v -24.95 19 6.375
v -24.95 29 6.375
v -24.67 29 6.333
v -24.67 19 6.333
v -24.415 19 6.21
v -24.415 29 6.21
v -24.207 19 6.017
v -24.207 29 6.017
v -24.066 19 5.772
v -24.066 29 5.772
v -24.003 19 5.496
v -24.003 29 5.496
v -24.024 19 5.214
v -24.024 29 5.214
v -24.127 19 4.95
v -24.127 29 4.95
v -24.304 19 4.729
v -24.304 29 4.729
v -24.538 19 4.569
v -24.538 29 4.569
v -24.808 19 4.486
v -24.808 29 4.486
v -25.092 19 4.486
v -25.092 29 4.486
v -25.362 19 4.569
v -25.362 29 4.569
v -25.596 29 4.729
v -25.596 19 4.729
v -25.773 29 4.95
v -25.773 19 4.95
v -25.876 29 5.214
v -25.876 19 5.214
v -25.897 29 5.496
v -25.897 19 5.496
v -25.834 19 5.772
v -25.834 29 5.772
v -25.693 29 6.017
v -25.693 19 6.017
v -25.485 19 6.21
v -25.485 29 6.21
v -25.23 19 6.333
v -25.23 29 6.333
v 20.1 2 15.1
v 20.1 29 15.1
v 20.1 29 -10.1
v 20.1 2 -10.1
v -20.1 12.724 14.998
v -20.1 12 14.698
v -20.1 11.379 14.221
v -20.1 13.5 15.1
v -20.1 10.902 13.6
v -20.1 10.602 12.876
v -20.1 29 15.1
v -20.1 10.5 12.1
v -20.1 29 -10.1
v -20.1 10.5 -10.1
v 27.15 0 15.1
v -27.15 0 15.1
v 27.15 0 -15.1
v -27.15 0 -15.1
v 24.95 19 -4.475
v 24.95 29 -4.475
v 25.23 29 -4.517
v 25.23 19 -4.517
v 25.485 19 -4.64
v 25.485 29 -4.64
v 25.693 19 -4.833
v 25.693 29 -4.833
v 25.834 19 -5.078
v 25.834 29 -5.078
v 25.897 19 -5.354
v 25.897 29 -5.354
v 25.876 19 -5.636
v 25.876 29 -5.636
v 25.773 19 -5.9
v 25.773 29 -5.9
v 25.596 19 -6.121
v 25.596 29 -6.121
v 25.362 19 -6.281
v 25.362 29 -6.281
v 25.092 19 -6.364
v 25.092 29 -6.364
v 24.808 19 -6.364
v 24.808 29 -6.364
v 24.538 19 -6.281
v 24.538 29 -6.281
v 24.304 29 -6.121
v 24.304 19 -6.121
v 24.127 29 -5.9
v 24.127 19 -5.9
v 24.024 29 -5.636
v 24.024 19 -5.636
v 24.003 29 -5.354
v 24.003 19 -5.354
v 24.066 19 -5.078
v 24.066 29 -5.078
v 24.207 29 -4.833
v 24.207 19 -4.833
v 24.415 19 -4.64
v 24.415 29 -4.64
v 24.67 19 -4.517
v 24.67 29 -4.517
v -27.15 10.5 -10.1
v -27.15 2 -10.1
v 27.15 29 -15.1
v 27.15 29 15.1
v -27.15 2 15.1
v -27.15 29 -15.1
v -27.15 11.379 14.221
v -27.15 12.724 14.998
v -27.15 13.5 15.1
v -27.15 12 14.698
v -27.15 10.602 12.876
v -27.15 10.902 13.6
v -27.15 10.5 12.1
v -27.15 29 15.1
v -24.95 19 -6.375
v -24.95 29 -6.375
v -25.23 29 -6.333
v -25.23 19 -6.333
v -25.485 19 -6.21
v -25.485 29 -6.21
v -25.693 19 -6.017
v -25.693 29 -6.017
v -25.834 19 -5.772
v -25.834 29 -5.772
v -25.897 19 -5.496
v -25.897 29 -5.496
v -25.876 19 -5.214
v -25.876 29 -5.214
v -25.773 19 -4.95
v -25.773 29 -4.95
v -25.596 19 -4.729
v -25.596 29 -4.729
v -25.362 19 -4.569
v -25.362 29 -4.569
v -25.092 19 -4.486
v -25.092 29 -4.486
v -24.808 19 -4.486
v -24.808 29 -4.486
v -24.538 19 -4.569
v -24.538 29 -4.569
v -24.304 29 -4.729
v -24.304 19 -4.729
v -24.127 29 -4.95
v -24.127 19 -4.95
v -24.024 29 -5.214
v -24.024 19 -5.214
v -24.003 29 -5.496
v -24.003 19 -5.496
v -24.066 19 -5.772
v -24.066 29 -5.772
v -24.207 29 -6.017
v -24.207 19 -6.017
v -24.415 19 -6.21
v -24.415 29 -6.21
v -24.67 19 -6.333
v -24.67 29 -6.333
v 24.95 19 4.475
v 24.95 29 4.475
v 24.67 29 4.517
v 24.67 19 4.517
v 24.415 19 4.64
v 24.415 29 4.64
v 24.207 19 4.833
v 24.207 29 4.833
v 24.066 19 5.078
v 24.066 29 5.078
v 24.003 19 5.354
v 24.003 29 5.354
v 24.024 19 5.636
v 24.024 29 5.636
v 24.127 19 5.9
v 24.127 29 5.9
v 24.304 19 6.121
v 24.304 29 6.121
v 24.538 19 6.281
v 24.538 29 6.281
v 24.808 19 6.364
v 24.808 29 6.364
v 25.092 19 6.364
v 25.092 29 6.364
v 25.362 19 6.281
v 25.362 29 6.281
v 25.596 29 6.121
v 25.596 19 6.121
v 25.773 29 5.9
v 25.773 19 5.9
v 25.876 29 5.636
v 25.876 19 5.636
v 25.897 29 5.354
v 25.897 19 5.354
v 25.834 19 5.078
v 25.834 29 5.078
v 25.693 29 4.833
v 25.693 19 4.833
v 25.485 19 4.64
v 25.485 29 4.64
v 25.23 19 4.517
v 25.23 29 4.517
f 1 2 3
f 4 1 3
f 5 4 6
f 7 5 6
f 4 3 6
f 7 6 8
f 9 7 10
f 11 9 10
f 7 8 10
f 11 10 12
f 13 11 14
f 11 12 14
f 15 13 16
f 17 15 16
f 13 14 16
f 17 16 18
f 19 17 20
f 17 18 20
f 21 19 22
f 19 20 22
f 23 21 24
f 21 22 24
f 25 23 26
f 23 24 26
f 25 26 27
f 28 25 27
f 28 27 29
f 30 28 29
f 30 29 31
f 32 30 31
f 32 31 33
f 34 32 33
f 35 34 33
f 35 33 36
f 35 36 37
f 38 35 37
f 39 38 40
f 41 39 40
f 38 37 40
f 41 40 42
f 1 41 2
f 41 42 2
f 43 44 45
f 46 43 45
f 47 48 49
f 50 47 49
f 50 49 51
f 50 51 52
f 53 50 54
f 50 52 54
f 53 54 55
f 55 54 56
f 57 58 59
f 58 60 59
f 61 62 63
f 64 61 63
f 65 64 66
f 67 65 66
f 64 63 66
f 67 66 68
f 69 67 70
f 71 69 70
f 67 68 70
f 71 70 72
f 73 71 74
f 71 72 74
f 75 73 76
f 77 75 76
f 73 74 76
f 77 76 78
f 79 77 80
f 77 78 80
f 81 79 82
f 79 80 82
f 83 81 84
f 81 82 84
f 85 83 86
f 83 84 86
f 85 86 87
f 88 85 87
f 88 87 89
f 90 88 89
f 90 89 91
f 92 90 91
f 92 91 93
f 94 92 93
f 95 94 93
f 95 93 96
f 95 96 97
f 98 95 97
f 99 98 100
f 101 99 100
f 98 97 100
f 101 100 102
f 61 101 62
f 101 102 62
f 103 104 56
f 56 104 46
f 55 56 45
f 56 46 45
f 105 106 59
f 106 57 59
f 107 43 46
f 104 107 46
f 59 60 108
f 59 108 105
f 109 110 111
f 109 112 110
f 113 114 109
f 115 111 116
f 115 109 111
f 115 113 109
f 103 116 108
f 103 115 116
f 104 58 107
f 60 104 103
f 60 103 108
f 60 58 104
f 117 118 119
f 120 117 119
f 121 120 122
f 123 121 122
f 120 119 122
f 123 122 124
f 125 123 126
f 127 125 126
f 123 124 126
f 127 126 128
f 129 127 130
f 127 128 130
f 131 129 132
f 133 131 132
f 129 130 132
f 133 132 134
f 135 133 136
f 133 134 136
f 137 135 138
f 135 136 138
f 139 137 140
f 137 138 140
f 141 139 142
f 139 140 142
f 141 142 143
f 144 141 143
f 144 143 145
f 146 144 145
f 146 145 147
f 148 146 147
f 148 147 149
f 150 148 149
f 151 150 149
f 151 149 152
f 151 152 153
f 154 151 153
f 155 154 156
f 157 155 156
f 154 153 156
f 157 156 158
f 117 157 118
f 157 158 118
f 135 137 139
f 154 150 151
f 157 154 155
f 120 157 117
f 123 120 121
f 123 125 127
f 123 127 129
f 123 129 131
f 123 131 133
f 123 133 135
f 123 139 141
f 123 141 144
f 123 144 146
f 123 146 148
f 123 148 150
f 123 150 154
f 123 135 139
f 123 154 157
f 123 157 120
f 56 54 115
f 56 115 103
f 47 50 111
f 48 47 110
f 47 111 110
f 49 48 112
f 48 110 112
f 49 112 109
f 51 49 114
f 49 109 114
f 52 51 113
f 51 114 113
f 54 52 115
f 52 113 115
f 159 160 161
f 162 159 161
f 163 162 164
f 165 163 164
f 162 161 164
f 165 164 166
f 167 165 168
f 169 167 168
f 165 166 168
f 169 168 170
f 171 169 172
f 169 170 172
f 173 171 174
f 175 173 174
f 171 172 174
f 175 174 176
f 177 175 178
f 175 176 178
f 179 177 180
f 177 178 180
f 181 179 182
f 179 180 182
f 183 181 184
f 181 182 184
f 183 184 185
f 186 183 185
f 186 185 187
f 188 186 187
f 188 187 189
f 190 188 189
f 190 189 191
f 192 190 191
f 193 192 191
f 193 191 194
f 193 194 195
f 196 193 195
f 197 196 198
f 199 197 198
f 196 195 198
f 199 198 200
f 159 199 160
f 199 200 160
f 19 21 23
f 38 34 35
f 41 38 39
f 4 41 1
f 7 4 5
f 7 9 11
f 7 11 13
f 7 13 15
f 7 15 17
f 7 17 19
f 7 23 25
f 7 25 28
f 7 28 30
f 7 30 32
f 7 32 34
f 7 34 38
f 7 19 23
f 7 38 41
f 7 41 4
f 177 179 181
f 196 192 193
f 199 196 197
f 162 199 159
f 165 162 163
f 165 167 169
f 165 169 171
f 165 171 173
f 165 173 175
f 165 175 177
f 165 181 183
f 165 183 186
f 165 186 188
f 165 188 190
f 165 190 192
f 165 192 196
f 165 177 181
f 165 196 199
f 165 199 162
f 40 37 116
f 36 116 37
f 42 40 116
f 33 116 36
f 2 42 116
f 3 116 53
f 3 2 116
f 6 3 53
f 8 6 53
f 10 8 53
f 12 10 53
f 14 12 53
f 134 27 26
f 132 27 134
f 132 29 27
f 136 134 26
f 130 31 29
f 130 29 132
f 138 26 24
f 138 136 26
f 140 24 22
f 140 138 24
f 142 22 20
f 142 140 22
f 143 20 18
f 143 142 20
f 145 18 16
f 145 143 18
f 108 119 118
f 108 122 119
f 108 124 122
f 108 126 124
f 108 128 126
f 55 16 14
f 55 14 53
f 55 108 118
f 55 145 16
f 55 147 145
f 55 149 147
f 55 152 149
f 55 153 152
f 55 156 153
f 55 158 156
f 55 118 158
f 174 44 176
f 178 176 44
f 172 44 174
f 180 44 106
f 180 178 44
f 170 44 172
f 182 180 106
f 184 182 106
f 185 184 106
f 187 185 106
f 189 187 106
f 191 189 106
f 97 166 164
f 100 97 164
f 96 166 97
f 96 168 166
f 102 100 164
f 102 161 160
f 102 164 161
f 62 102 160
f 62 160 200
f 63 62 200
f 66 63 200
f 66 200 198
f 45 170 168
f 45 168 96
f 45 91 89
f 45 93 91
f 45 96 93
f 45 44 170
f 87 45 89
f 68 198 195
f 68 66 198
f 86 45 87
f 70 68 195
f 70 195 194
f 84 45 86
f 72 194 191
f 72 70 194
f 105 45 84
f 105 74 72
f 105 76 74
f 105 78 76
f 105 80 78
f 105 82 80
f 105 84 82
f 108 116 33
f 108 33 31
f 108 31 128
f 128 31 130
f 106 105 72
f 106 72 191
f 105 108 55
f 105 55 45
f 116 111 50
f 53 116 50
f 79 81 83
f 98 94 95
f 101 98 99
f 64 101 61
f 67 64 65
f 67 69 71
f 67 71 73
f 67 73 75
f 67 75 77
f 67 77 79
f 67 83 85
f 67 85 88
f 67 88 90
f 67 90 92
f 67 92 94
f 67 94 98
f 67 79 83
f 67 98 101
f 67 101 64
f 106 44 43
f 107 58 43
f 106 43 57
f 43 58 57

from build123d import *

# Parameters (mm, degrees)
BOSS_EXTRUDE1_DEPTH = 2
SKETCH7_W           = 54.3
SKETCH7_H           = 30.2
SKETCH7_W_2         = 40.2
SKETCH7_H_2         = 20.2
BOSS_EXTRUDE3_DEPTH = 27
SKETCH8_W           = 40.2
SKETCH8_H           = 5
CUT_EXTRUDE2_DEPTH  = 27
CUT_EXTRUDE3_REACH  = 61.157
SKETCH9_W           = 25.2
SKETCH9_H           = 8.5
SKETCH10_R          = 0.95
CUT_EXTRUDE4_DEPTH  = 10
FILLET1_R           = 3
CUT_EXTRUDE5_REACH  = 59.459


with BuildPart() as part:
    # Sketch1 → Boss-Extrude1 (new body)
    with BuildSketch(Plane(origin=(0, 0, 0), x_dir=(1, 0, 0), z_dir=(0, 1, 0))):
        Polygon((-27.15, 10.1), (-27.15, -10.1), (-27.15, -15.1), (27.15, -15.1), (27.15, -10.1), (27.15, 10.1), (27.15, 15.1), (-27.15, 15.1), align=None)
    extrude(amount=BOSS_EXTRUDE1_DEPTH)

    # Sketch7 → Boss-Extrude3 (add)
    with BuildSketch(Plane(origin=(0, 2, 0), x_dir=(1, 0, 0), z_dir=(0, 1, 0))):
        Rectangle(SKETCH7_W, SKETCH7_H)
        Rectangle(SKETCH7_W_2, SKETCH7_H_2, mode=Mode.SUBTRACT)
    extrude(amount=BOSS_EXTRUDE3_DEPTH)

    # Sketch8 → Cut-Extrude2 (cut)
    with BuildSketch(Plane(origin=(0, 29, 0), x_dir=(1, 0, 0), z_dir=(0, 1, 0))):
        with Locations((0, -12.6)):
            Rectangle(SKETCH8_W, SKETCH8_H)
    extrude(amount=-CUT_EXTRUDE2_DEPTH, mode=Mode.SUBTRACT)

    # Sketch9 → Cut-Extrude3 (cut, up to next)
    with BuildSketch(Plane(origin=(-22.15, 0, 0), x_dir=(0, 0, -1), z_dir=(1, 0, 0)), mode=Mode.PRIVATE) as cut_extrude3_sk1:
        with Locations((-2.5, 6.25)):
            Rectangle(SKETCH9_W, SKETCH9_H)
    cut_extrude3_tool1 = extrude(cut_extrude3_sk1.sketch, amount=-CUT_EXTRUDE3_REACH, mode=Mode.PRIVATE) & part.part
    add(cut_extrude3_tool1.solids().sort_by_distance((-22.15, 6.25, 2.5))[0], mode=Mode.SUBTRACT)

    # Sketch10 → Cut-Extrude4 (cut)
    with BuildSketch(Plane(origin=(0, 29, 0), x_dir=(1, 0, 0), z_dir=(0, 1, 0))):
        with Locations(Location((-24.95, -5.425, 0), (0, 0, 270))):
            Circle(SKETCH10_R)
        with Locations(Location((-24.95, 5.425, 0), (0, 0, 90))):
            Circle(SKETCH10_R)
        with Locations(Location((24.95, -5.425, 0), (0, 0, 90))):
            Circle(SKETCH10_R)
        with Locations(Location((24.95, 5.425, 0), (0, 0, 270))):
            Circle(SKETCH10_R)
    extrude(amount=-CUT_EXTRUDE4_DEPTH, mode=Mode.SUBTRACT)

    # Fillet1
    fillet1_edges = [part.edges().sort_by_distance(p)[0] for p in [
        (-24.65, 10.5, 15.1),
    ]]
    fillet(fillet1_edges, radius=FILLET1_R)

    # Sketch12 → Cut-Extrude5 (cut, up to next)
    with BuildSketch(Plane(origin=(-20.1, 0, 0), x_dir=(0, 0, -1), z_dir=(1, 0, 0)), mode=Mode.PRIVATE) as cut_extrude5_sk1:
        with BuildLine():
            Line((-15.1, 2), (10.1, 2))
            Line((10.1, 2), (10.1, 10.5))
            Line((10.1, 10.5), (-12.1, 10.5))
            ThreePointArc((-12.1, 10.5), (-14.221320344, 11.378679656), (-15.1, 13.5))
            Line((-15.1, 13.5), (-15.1, 2))
        make_face()
    cut_extrude5_tool1 = extrude(cut_extrude5_sk1.sketch, amount=-CUT_EXTRUDE5_REACH, mode=Mode.PRIVATE) & part.part
    add(cut_extrude5_tool1.solids().sort_by_distance((-20.1, 6.293968, 2.606609))[0], mode=Mode.SUBTRACT)


solid = part.part
